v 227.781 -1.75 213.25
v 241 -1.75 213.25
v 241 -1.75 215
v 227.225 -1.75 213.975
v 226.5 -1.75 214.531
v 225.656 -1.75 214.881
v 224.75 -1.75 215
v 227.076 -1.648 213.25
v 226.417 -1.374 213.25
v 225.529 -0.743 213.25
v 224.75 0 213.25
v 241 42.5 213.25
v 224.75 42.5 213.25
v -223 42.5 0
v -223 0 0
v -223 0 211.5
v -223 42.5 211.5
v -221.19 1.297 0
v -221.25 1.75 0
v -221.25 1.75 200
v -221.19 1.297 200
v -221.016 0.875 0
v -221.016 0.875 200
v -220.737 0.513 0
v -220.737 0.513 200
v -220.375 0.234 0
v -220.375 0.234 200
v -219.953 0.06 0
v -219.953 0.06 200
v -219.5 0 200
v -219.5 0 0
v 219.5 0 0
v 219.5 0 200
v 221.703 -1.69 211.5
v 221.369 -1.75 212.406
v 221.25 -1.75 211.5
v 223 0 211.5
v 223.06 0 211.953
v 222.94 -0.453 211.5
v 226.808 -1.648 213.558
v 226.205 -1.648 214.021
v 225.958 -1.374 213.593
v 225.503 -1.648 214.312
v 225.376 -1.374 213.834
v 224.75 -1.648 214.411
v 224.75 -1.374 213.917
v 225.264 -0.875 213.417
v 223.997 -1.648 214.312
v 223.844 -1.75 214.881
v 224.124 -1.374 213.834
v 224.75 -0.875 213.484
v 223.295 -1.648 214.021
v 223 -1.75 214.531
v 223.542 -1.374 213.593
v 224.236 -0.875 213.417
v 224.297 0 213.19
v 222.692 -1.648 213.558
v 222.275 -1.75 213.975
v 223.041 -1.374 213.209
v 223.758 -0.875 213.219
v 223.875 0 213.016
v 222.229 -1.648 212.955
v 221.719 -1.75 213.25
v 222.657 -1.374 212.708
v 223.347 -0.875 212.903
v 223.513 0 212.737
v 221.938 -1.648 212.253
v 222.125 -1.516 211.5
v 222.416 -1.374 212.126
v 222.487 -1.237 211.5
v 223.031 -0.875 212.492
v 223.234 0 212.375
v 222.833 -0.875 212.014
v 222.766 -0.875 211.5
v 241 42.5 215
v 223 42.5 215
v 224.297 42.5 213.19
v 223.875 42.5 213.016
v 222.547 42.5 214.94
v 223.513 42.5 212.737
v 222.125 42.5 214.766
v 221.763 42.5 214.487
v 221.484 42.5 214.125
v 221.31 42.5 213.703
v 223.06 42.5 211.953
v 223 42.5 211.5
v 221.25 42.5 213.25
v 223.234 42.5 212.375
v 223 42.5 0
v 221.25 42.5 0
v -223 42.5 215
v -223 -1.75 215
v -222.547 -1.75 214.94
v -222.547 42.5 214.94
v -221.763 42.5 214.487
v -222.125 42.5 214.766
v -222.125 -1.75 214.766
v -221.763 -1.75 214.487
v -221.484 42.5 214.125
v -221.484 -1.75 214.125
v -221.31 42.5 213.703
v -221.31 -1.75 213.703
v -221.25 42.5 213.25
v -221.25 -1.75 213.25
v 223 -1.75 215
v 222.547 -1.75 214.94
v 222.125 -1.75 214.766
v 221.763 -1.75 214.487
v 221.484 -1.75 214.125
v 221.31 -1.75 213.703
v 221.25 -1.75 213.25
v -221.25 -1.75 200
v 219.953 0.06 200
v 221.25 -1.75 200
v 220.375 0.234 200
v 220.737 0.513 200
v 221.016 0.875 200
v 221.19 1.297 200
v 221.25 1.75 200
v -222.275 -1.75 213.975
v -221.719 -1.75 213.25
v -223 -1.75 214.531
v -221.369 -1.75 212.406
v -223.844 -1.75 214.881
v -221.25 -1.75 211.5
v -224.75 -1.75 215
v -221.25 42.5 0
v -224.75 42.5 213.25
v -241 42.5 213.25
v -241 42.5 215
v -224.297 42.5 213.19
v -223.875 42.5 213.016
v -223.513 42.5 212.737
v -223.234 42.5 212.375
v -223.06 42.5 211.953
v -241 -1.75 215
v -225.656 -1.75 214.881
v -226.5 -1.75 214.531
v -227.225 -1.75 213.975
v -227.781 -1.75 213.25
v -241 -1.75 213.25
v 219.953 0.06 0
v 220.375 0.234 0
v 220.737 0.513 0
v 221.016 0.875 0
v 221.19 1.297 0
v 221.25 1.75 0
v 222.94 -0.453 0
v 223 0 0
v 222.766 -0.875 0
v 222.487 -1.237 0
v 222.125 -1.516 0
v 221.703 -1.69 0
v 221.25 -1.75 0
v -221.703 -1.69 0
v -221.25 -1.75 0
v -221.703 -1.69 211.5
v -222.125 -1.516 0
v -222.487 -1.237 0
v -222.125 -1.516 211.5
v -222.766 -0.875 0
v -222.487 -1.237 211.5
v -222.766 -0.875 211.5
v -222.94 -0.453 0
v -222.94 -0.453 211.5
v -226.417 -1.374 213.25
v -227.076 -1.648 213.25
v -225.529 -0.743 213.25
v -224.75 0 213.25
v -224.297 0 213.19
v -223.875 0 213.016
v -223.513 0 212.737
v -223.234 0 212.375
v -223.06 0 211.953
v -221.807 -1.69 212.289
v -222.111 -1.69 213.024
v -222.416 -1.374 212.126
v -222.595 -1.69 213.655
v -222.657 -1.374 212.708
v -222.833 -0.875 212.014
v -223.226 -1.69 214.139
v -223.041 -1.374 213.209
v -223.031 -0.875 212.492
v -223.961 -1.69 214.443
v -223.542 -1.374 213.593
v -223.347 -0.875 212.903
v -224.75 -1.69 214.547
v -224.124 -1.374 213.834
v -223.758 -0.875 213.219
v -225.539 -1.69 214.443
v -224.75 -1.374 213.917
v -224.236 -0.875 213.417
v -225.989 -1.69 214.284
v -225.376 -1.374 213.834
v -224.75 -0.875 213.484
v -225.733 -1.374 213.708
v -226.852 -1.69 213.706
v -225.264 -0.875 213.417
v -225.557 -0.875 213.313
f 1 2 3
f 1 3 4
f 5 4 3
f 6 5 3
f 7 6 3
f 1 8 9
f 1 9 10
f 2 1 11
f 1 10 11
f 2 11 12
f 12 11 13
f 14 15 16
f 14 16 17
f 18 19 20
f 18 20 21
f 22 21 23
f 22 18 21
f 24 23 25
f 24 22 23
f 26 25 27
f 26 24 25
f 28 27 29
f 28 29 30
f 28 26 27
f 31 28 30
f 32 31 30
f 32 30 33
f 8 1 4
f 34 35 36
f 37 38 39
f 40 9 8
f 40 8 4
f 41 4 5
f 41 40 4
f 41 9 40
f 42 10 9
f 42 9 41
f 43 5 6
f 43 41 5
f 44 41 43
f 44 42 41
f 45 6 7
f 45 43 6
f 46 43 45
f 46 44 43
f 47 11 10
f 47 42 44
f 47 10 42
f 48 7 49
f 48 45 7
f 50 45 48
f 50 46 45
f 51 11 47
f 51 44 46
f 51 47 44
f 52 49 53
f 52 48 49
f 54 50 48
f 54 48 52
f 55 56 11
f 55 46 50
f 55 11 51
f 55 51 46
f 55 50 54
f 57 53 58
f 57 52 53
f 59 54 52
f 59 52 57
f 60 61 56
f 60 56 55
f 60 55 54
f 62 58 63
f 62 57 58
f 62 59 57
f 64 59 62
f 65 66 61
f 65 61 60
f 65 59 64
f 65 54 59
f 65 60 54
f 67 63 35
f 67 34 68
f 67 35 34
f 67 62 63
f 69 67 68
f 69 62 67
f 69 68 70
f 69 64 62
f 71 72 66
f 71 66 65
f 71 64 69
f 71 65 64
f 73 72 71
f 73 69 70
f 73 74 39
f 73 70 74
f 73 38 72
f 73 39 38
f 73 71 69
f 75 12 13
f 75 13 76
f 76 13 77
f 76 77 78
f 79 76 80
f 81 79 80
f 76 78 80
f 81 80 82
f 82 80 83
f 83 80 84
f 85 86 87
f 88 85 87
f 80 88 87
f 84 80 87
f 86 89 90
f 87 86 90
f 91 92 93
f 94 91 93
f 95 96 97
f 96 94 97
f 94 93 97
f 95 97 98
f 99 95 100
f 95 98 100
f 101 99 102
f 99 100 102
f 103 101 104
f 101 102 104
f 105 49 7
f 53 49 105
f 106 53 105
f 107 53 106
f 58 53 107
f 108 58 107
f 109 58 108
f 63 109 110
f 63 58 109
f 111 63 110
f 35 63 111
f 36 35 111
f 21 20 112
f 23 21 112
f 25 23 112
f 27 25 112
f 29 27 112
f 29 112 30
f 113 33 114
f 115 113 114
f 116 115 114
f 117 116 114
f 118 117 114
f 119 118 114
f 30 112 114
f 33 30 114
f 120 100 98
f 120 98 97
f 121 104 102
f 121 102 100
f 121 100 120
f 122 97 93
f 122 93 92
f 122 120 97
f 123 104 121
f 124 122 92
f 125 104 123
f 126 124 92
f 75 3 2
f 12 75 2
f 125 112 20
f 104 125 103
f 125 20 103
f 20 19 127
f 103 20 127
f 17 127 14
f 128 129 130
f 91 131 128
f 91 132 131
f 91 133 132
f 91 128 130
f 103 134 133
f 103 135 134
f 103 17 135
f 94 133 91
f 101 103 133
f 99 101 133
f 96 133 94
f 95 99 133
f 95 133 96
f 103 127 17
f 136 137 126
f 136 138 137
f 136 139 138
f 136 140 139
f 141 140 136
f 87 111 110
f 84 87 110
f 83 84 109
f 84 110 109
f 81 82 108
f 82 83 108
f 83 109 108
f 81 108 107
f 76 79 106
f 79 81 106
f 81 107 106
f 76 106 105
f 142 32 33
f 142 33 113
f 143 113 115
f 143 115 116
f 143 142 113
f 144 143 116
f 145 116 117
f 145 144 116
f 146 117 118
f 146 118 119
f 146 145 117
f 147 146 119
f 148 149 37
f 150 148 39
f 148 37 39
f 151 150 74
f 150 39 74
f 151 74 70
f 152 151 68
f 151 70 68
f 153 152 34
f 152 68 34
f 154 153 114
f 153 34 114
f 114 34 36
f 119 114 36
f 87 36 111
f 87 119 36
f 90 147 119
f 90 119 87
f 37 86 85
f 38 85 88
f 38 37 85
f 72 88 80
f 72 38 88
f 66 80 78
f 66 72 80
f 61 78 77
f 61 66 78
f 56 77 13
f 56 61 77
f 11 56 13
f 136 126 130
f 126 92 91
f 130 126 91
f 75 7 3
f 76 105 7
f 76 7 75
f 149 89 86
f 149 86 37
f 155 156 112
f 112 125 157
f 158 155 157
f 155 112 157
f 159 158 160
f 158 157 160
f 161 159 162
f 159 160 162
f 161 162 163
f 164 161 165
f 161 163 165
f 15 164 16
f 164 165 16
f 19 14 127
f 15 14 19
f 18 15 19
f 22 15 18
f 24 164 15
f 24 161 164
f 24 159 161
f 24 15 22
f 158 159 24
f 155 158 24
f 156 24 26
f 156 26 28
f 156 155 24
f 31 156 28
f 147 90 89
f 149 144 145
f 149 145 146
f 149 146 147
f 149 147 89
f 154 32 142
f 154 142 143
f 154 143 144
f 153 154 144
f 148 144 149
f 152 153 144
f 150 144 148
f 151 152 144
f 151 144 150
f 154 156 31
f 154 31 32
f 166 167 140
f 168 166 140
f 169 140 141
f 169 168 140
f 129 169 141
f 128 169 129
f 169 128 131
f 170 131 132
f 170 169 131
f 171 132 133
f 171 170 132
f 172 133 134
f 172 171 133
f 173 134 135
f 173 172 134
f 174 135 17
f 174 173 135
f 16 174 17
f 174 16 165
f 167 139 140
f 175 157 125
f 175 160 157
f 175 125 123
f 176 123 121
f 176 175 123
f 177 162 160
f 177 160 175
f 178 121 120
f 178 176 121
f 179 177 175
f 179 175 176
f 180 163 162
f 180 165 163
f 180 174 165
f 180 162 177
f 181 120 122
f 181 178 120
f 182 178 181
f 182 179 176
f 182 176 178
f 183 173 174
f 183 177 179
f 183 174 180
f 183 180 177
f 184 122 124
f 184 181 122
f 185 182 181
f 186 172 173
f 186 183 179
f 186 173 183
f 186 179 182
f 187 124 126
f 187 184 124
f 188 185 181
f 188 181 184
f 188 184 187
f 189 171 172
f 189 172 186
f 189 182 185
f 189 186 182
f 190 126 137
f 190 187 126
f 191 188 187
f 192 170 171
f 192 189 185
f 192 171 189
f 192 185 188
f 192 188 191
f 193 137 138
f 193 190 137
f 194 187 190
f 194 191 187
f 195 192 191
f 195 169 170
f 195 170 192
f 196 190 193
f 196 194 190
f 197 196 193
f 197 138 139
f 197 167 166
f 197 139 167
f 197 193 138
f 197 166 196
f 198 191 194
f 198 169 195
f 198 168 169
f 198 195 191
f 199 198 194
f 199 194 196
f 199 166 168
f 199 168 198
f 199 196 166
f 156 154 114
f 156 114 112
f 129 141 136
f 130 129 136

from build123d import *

# Parameters (mm, degrees)
BOSS_EXTRUDE1_DEPTH = 200
SKETCH2_W           = 1.75
SKETCH2_H           = 44.25
BOSS_EXTRUDE2_DEPTH = 15
SKETCH3_W           = 1.75
SKETCH3_H           = 44.25
BOSS_EXTRUDE3_DEPTH = 18
SKETCH4_W           = 1.75
SKETCH4_H           = 44.25
BOSS_EXTRUDE4_DEPTH = 18
FILLET1_R           = 1.75


with BuildPart() as part:
    # Sketch1 → Boss-Extrude1 (new body)
    with BuildSketch(Plane.XY):
        Polygon((-221.25, 0), (221.25, 0), (221.25, 42.5), (223, 42.5), (223, -1.75), (-223, -1.75), (-223, 42.5), (-221.25, 42.5), align=None)
    extrude(amount=BOSS_EXTRUDE1_DEPTH)

    # Sketch2 → Boss-Extrude2 (add)
    with BuildSketch(Plane.XY.offset(200)):
        with Locations((-222.125, 20.375)):
            Rectangle(SKETCH2_W, SKETCH2_H)
        with Locations((222.125, 20.375)):
            Rectangle(SKETCH2_W, SKETCH2_H)
    extrude(amount=BOSS_EXTRUDE2_DEPTH)

    # Sketch3 → Boss-Extrude3 (add)
    with BuildSketch(Plane(origin=(223, 0, 0), x_dir=(0, 0, -1), z_dir=(1, 0, 0))):
        with Locations((-214.125, 20.375)):
            Rectangle(SKETCH3_W, SKETCH3_H)
    extrude(amount=BOSS_EXTRUDE3_DEPTH)

    # Sketch4 → Boss-Extrude4 (add)
    with BuildSketch(Plane.ZY.offset(223)):
        with Locations((214.125, 20.375)):
            Rectangle(SKETCH4_W, SKETCH4_H)
    extrude(amount=BOSS_EXTRUDE4_DEPTH)

    # Fillet1
    # the kernel refuses this fillet: 1.75 mm, written as the material it adds along each edge
    with BuildSketch(Plane(origin=(-221.25, 0, 0), x_dir=(1, 0, 0), z_dir=(0, 0, 1))) as fillet1_piece_1:
        with BuildLine():
            CenterArc((FILLET1_R, FILLET1_R), FILLET1_R, 180, 90)
            Line((0, FILLET1_R), (0, 0))
            Line((0, 0), (FILLET1_R, 0))
        make_face()
    extrude(amount=200)
    with BuildSketch(Plane(origin=(221.25, 0, 0), x_dir=(-1, 0, 0), z_dir=(0, 0, 1))) as fillet1_piece_2:
        with BuildLine():
            CenterArc((FILLET1_R, -FILLET1_R), FILLET1_R, 90, 90)
            Line((0, -FILLET1_R), (0, 0))
            Line((0, 0), (FILLET1_R, 0))
        make_face()
    extrude(amount=200)
    with BuildSketch(Plane(origin=(223, -1.75, 213.25), x_dir=(1, 0, 0), z_dir=(0, 1, 0)), Plane(origin=(-223, -1.75, 213.25), x_dir=(0, 0, -1), z_dir=(0, 1, 0))) as fillet1_piece_3:
        with BuildLine():
            CenterArc((FILLET1_R, FILLET1_R), FILLET1_R, 180, 90)
            Line((0, FILLET1_R), (0, 0))
            Line((0, 0), (FILLET1_R, 0))
        make_face()
    extrude(amount=44.25)
    # the kernel refuses this fillet: 1.75 mm, written as the material it takes off along each edge
    with BuildSketch(Plane(origin=(-221.25, -6.125, 215), x_dir=(0, 0, -1), z_dir=(0, 1, 0))) as fillet1_2_piece_1:
        with BuildLine():
            CenterArc((FILLET1_R, FILLET1_R), FILLET1_R, 180, 90)
            Line((0, FILLET1_R), (0, 0))
            Line((0, 0), (FILLET1_R, 0))
        make_face()
    extrude(amount=53, mode=Mode.SUBTRACT)
    with BuildSketch(Plane(origin=(221.25, -6.125, 215), x_dir=(0, 0, -1), z_dir=(0, 1, 0))) as fillet1_2_piece_2:
        with BuildLine():
            CenterArc((FILLET1_R, -FILLET1_R), FILLET1_R, 90, 90)
            Line((0, -FILLET1_R), (0, 0))
            Line((0, 0), (FILLET1_R, 0))
        make_face()
    extrude(amount=53, mode=Mode.SUBTRACT)
    with BuildSketch(Plane(origin=(223, -1.75, 211.5), x_dir=(-1, 0, 0), z_dir=(0, 0, -1))) as fillet1_2_piece_3:
        with BuildLine():
            CenterArc((FILLET1_R, FILLET1_R), FILLET1_R, 180, 90)
            Line((0, FILLET1_R), (0, 0))
            Line((0, 0), (FILLET1_R, 0))
        make_face()
    extrude(amount=215.875, mode=Mode.SUBTRACT)
    with BuildSketch(Plane(origin=(-223, -1.75, 211.5), x_dir=(1, 0, 0), z_dir=(0, 0, -1))) as fillet1_2_piece_4:
        with BuildLine():
            CenterArc((FILLET1_R, -FILLET1_R), FILLET1_R, 90, 90)
            Line((0, -FILLET1_R), (0, 0))
            Line((0, 0), (FILLET1_R, 0))
        make_face()
    extrude(amount=215.875, mode=Mode.SUBTRACT)
    with BuildSketch(Plane(origin=(-224.75, -1.75, 211.5), x_dir=(1, 0, 0), z_dir=(0, 0, -1))) as fillet1_2_piece_5:
        with BuildLine():
            CenterArc((1.75 + FILLET1_R, -FILLET1_R), FILLET1_R, 90, 90)
            Line((1.75, -FILLET1_R), (1.75, 0))
            Line((1.75, 0), (1.75 + FILLET1_R, 0))
        make_face()
    revolve(axis=Axis((-224.75, -1.75, 211.5), (0, -1, 0)), revolution_arc=233.296989237, mode=Mode.SUBTRACT)
    with BuildSketch(Plane(origin=(224.75, -1.75, 211.5), x_dir=(0.5976672776328118, 0, -0.80174423929766), z_dir=(-0.80174423929766, 0, -0.5976672776328118))) as fillet1_2_piece_6:
        with BuildLine():
            CenterArc((1.75 + FILLET1_R, -FILLET1_R), FILLET1_R, 90, 90)
            Line((1.75, -FILLET1_R), (1.75, 0))
            Line((1.75, 0), (1.75 + FILLET1_R, 0))
        make_face()
    revolve(axis=Axis((224.75, -1.75, 211.5), (0, -1, 0)), revolution_arc=233.296989237, mode=Mode.SUBTRACT)


solid = part.part
